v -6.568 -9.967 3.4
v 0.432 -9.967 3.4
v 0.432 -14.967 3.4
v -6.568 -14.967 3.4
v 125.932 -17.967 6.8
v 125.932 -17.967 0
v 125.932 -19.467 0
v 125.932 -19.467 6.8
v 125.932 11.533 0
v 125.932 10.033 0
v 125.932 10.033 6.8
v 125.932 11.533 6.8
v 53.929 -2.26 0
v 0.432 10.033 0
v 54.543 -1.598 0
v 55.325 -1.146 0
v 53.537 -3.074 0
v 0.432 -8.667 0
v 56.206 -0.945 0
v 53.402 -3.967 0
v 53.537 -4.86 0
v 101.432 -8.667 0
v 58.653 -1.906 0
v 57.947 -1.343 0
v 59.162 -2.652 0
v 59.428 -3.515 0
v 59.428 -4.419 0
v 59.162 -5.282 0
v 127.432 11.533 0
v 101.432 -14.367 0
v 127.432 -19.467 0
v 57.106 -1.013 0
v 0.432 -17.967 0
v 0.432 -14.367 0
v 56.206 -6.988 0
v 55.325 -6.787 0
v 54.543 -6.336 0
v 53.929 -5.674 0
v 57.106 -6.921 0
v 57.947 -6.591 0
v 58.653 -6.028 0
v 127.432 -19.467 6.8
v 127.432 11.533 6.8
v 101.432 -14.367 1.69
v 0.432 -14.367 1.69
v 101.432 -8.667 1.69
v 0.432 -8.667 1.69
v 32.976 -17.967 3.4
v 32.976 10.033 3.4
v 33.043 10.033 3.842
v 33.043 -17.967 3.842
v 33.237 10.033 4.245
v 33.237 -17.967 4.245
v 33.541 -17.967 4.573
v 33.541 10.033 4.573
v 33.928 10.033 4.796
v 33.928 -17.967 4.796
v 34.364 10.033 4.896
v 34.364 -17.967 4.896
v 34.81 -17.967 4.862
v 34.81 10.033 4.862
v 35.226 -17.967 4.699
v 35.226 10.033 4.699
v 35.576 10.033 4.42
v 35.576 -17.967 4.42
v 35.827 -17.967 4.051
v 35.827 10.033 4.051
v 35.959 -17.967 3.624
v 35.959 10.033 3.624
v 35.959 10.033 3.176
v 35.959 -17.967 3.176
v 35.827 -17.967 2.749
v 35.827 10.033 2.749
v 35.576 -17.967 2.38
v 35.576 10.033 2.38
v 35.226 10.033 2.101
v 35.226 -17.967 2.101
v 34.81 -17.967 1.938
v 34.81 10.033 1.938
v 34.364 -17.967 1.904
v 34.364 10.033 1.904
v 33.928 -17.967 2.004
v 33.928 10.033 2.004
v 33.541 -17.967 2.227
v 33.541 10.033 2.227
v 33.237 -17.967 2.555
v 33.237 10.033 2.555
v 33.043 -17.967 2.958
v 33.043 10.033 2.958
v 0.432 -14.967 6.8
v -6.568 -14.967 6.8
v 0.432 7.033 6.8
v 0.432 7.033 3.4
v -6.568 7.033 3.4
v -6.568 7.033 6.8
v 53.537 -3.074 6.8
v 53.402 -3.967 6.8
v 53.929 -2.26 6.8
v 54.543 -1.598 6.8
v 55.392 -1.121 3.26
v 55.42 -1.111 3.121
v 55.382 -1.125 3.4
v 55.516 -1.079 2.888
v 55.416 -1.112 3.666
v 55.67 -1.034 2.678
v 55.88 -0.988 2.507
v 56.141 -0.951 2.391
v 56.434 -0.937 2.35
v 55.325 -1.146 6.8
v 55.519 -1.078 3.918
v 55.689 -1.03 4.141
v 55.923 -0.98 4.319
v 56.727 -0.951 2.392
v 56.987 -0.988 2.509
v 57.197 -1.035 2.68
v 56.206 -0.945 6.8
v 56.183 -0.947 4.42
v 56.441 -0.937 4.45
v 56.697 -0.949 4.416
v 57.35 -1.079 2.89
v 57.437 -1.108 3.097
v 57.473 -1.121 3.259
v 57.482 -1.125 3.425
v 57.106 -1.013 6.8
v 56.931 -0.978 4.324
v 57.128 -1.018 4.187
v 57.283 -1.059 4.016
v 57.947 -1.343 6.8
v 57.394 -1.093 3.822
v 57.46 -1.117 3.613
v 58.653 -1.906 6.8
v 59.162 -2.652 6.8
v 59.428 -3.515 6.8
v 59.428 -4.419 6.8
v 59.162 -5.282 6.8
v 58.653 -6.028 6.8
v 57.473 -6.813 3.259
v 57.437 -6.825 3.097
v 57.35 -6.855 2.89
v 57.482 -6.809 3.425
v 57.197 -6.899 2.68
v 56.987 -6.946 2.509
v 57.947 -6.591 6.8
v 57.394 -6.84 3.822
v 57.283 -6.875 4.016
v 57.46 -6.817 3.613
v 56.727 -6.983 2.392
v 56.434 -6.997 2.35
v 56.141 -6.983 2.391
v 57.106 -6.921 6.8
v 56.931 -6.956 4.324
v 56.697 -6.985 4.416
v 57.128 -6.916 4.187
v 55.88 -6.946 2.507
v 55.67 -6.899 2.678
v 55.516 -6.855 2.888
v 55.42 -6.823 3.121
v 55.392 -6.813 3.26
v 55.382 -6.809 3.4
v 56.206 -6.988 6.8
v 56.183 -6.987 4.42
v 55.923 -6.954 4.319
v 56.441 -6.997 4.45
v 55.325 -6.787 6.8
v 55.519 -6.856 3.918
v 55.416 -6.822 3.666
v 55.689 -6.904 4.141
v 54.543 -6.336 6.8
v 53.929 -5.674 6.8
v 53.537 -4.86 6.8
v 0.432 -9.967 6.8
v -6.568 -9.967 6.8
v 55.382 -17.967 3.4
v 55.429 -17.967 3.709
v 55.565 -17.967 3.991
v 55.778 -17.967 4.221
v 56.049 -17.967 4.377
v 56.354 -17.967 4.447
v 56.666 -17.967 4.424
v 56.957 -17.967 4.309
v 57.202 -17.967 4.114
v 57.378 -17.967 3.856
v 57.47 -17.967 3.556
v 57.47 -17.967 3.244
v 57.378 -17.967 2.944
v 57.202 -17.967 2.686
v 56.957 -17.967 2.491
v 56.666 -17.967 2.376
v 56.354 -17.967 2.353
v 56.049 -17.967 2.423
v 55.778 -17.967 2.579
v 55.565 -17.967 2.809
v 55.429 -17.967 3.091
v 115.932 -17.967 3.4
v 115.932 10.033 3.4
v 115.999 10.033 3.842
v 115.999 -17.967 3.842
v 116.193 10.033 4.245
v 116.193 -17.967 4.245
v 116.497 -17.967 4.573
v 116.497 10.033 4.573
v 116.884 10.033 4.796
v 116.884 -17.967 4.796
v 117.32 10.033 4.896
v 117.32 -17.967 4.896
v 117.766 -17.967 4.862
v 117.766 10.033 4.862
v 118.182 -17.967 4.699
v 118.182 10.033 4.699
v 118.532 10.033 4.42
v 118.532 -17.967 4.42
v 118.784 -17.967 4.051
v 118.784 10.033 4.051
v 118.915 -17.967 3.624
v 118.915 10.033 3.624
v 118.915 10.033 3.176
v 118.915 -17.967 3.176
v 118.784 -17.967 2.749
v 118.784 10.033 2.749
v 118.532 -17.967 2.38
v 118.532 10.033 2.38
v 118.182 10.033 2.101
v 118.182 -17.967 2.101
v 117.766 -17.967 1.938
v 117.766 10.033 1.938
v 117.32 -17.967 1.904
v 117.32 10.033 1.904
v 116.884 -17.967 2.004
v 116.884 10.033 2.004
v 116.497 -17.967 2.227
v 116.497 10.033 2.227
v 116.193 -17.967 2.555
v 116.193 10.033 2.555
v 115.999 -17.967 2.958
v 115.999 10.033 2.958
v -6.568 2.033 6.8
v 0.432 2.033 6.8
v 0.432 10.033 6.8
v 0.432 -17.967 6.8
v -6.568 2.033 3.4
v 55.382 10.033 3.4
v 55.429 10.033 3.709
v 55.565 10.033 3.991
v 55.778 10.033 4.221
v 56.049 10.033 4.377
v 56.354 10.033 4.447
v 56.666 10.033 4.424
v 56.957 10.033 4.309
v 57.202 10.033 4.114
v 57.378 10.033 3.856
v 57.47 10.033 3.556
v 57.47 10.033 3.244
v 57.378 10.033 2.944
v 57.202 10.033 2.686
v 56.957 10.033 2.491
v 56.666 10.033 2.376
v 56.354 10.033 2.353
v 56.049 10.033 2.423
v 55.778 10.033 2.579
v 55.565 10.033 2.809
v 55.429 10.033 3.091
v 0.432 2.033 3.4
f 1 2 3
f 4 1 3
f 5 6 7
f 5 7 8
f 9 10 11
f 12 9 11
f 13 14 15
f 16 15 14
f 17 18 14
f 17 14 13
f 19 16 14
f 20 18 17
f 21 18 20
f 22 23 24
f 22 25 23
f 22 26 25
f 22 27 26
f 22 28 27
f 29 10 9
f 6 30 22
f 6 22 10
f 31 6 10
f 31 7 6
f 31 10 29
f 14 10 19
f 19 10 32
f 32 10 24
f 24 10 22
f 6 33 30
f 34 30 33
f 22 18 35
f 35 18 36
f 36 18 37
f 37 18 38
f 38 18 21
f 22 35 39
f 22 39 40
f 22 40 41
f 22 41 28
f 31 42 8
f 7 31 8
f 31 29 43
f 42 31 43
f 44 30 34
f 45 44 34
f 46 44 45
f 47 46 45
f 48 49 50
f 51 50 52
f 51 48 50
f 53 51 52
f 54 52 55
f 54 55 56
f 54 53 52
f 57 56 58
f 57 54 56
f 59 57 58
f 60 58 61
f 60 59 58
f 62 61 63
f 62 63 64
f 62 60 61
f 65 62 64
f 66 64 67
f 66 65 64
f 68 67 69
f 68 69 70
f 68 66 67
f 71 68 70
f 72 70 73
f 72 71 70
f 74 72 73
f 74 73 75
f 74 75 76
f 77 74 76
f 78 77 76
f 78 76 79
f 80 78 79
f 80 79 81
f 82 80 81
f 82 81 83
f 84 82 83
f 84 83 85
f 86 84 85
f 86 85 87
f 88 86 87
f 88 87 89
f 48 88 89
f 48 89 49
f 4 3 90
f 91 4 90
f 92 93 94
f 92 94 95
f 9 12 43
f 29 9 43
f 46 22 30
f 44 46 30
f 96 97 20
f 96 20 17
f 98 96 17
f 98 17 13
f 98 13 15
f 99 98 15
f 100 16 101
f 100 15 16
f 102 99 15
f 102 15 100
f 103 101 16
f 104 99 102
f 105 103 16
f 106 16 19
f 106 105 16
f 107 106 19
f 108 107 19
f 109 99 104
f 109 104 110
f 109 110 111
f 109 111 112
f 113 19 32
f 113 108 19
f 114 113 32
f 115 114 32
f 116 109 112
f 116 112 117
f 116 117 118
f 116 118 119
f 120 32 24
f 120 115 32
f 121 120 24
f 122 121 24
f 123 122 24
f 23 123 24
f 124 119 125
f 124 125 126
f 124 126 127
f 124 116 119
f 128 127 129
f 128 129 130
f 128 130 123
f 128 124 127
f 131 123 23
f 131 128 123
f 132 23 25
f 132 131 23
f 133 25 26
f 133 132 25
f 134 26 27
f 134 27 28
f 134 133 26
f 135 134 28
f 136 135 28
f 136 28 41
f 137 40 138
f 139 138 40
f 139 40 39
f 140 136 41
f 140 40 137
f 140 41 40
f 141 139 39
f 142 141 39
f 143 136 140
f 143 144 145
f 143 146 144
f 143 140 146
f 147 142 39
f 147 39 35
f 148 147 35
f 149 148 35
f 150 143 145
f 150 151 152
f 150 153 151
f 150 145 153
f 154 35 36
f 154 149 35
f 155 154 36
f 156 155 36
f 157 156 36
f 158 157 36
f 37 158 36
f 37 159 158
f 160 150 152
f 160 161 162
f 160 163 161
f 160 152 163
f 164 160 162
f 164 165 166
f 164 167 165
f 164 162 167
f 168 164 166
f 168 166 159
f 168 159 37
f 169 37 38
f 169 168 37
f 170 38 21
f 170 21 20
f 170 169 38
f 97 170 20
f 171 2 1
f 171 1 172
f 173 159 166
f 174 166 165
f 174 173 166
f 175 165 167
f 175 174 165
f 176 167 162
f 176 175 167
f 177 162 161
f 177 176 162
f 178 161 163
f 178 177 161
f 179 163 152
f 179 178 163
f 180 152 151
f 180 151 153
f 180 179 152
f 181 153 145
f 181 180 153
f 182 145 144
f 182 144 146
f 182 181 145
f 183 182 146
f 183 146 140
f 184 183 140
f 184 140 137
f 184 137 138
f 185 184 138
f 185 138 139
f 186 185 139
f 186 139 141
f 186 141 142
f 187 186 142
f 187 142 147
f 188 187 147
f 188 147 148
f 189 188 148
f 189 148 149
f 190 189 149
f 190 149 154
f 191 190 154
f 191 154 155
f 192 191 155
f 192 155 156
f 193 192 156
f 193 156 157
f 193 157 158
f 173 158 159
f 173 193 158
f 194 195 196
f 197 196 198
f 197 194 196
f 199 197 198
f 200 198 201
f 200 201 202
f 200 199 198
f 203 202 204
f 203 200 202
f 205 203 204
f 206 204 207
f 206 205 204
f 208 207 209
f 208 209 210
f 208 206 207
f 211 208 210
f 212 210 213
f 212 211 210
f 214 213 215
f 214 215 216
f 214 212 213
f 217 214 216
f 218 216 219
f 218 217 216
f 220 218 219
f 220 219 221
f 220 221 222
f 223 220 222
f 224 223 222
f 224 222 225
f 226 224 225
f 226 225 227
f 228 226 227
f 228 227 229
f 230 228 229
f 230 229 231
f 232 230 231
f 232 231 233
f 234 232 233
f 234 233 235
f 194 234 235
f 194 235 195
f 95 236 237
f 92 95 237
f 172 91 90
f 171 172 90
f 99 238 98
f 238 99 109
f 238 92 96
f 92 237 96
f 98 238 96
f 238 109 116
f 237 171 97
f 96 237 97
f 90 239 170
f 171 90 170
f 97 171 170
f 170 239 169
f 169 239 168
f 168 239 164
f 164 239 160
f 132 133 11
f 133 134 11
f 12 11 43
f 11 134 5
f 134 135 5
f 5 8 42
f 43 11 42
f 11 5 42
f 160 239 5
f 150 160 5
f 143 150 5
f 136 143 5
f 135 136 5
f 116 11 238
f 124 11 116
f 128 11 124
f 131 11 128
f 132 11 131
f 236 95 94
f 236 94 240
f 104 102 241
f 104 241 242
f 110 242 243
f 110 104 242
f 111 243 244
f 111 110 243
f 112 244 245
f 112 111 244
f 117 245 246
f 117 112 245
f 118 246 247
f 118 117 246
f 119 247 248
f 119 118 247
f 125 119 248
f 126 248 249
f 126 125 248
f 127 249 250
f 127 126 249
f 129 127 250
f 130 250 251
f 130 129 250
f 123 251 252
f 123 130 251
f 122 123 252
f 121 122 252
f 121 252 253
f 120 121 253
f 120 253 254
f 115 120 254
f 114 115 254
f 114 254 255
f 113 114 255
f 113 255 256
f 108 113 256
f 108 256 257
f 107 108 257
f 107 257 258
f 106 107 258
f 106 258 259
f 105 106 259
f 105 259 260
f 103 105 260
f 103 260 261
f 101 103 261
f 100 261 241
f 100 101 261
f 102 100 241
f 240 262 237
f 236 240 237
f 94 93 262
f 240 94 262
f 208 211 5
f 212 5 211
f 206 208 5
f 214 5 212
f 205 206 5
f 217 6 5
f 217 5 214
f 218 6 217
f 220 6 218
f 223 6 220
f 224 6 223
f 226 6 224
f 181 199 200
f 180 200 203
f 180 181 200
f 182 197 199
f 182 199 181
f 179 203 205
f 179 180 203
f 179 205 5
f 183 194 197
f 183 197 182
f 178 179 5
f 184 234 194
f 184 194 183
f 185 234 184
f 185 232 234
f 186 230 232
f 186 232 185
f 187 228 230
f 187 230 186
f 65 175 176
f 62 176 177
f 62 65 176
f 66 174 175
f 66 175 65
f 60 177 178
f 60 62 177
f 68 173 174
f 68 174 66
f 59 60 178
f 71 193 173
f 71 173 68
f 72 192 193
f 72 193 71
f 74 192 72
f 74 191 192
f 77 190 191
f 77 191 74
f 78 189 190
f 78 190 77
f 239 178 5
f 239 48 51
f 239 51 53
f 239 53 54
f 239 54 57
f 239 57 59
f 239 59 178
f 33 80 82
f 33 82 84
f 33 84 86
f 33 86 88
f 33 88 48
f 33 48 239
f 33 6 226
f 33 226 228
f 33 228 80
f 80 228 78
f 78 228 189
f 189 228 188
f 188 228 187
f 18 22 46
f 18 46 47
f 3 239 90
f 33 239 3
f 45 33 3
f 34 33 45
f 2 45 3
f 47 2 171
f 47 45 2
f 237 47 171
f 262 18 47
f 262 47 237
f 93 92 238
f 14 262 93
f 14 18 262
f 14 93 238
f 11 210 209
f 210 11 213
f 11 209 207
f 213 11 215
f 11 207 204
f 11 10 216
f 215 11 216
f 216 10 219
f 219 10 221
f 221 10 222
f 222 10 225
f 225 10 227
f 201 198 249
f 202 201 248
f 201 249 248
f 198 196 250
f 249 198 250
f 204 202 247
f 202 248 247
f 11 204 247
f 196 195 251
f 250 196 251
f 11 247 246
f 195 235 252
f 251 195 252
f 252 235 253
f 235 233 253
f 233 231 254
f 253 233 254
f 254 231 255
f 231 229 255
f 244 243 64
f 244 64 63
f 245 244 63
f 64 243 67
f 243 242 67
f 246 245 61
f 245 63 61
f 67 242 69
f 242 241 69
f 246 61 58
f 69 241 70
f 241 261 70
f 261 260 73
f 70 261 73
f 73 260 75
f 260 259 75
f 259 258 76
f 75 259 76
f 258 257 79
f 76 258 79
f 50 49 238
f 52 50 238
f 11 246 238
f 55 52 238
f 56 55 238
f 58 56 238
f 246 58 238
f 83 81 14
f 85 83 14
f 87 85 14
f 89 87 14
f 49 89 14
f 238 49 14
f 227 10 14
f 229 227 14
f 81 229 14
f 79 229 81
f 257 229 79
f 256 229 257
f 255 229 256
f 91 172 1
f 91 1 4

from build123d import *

# Parameters (mm, degrees)
SKETCH015_W     = 127
SKETCH015_H     = 28
PAD006_DEPTH    = 6.8
SKETCH016_W     = 1.5
SKETCH016_H     = 6.8
PAD007_DEPTH    = 1.5
SKETCH017_W     = 1.5
SKETCH017_H     = 6.8
PAD008_DEPTH    = 1.5
SKETCH018_R     = 3.03
POCKET007_DEPTH = 6.801
SKETCH019_R     = 1.05
SKETCH019_R_2   = 1.5
POCKET008_DEPTH = 29.501
SKETCH020_W     = 101
SKETCH020_H     = 5.7
POCKET009_DEPTH = 1.69
SKETCH022_W     = 5
SKETCH022_H     = 3.4
PAD010_DEPTH    = 7


with BuildPart() as pocket009:
    # Sketch015 → Pad006 (new body)
    with BuildSketch(Plane.XY):
        with Locations((-63.932219, -3.966905)):
            Rectangle(SKETCH015_W, SKETCH015_H)
    extrude(amount=PAD006_DEPTH)

    # Sketch016 → Pad007 (new body)
    with BuildSketch(Plane.XZ.offset(17.966905)):
        with Locations((-126.682219, 3.4)):
            Rectangle(SKETCH016_W, SKETCH016_H)
    extrude(amount=PAD007_DEPTH)

    # Sketch017 → Pad008 (new body)
    with BuildSketch(Plane(origin=(0, 10.033095, 0), x_dir=(-1, 0, 0), z_dir=(0, 1, 0))):
        with Locations((126.682219, 3.4)):
            Rectangle(SKETCH017_W, SKETCH017_H)
    extrude(amount=PAD008_DEPTH)

    # Sketch018 → Pocket007 (cut, through all)
    with BuildSketch(Plane.XY.offset(6.8)):
        with Locations((-56.432219, -3.966905)):
            Circle(SKETCH018_R)
    extrude(amount=-POCKET007_DEPTH, mode=Mode.SUBTRACT)

    # Sketch019 → Pocket008 (cut, through all)
    with BuildSketch(Plane.XZ.offset(17.966905)):
        with Locations((-56.432219, 3.4)):
            Circle(SKETCH019_R)
        with Locations((-117.432219, 3.4)):
            Circle(SKETCH019_R_2)
        with Locations((-34.475986, 3.4)):
            Circle(SKETCH019_R_2)
    extrude(amount=-POCKET008_DEPTH, mode=Mode.SUBTRACT)

    # Sketch020 → Pocket009 (cut)
    with BuildSketch(Plane(origin=(0, 0, 0), x_dir=(1, 0, 0), z_dir=(0, 0, -1))):
        with Locations((-50.932219, 11.516905)):
            Rectangle(SKETCH020_W, SKETCH020_H)
    extrude(amount=-POCKET009_DEPTH, mode=Mode.SUBTRACT)


with BuildPart() as pad010:
    # Part__Mirroring: instance of Pocket009
    add(pocket009.part.mirror(Plane(origin=(0, 0, 0), x_dir=(0, -1, 0), z_dir=(1, 0, 0))))

    # Sketch022 → Pad010 (new body)
    with BuildSketch(Plane(origin=(0.432219, 0, 0), x_dir=(0, -1, 0), z_dir=(-1, 0, 0))):
        with Locations((-4.533095, 5.1)):
            Rectangle(SKETCH022_W, SKETCH022_H)
        with Locations((12.466905, 5.1)):
            Rectangle(SKETCH022_W, SKETCH022_H)
    extrude(amount=PAD010_DEPTH)


solid = pad010.part
